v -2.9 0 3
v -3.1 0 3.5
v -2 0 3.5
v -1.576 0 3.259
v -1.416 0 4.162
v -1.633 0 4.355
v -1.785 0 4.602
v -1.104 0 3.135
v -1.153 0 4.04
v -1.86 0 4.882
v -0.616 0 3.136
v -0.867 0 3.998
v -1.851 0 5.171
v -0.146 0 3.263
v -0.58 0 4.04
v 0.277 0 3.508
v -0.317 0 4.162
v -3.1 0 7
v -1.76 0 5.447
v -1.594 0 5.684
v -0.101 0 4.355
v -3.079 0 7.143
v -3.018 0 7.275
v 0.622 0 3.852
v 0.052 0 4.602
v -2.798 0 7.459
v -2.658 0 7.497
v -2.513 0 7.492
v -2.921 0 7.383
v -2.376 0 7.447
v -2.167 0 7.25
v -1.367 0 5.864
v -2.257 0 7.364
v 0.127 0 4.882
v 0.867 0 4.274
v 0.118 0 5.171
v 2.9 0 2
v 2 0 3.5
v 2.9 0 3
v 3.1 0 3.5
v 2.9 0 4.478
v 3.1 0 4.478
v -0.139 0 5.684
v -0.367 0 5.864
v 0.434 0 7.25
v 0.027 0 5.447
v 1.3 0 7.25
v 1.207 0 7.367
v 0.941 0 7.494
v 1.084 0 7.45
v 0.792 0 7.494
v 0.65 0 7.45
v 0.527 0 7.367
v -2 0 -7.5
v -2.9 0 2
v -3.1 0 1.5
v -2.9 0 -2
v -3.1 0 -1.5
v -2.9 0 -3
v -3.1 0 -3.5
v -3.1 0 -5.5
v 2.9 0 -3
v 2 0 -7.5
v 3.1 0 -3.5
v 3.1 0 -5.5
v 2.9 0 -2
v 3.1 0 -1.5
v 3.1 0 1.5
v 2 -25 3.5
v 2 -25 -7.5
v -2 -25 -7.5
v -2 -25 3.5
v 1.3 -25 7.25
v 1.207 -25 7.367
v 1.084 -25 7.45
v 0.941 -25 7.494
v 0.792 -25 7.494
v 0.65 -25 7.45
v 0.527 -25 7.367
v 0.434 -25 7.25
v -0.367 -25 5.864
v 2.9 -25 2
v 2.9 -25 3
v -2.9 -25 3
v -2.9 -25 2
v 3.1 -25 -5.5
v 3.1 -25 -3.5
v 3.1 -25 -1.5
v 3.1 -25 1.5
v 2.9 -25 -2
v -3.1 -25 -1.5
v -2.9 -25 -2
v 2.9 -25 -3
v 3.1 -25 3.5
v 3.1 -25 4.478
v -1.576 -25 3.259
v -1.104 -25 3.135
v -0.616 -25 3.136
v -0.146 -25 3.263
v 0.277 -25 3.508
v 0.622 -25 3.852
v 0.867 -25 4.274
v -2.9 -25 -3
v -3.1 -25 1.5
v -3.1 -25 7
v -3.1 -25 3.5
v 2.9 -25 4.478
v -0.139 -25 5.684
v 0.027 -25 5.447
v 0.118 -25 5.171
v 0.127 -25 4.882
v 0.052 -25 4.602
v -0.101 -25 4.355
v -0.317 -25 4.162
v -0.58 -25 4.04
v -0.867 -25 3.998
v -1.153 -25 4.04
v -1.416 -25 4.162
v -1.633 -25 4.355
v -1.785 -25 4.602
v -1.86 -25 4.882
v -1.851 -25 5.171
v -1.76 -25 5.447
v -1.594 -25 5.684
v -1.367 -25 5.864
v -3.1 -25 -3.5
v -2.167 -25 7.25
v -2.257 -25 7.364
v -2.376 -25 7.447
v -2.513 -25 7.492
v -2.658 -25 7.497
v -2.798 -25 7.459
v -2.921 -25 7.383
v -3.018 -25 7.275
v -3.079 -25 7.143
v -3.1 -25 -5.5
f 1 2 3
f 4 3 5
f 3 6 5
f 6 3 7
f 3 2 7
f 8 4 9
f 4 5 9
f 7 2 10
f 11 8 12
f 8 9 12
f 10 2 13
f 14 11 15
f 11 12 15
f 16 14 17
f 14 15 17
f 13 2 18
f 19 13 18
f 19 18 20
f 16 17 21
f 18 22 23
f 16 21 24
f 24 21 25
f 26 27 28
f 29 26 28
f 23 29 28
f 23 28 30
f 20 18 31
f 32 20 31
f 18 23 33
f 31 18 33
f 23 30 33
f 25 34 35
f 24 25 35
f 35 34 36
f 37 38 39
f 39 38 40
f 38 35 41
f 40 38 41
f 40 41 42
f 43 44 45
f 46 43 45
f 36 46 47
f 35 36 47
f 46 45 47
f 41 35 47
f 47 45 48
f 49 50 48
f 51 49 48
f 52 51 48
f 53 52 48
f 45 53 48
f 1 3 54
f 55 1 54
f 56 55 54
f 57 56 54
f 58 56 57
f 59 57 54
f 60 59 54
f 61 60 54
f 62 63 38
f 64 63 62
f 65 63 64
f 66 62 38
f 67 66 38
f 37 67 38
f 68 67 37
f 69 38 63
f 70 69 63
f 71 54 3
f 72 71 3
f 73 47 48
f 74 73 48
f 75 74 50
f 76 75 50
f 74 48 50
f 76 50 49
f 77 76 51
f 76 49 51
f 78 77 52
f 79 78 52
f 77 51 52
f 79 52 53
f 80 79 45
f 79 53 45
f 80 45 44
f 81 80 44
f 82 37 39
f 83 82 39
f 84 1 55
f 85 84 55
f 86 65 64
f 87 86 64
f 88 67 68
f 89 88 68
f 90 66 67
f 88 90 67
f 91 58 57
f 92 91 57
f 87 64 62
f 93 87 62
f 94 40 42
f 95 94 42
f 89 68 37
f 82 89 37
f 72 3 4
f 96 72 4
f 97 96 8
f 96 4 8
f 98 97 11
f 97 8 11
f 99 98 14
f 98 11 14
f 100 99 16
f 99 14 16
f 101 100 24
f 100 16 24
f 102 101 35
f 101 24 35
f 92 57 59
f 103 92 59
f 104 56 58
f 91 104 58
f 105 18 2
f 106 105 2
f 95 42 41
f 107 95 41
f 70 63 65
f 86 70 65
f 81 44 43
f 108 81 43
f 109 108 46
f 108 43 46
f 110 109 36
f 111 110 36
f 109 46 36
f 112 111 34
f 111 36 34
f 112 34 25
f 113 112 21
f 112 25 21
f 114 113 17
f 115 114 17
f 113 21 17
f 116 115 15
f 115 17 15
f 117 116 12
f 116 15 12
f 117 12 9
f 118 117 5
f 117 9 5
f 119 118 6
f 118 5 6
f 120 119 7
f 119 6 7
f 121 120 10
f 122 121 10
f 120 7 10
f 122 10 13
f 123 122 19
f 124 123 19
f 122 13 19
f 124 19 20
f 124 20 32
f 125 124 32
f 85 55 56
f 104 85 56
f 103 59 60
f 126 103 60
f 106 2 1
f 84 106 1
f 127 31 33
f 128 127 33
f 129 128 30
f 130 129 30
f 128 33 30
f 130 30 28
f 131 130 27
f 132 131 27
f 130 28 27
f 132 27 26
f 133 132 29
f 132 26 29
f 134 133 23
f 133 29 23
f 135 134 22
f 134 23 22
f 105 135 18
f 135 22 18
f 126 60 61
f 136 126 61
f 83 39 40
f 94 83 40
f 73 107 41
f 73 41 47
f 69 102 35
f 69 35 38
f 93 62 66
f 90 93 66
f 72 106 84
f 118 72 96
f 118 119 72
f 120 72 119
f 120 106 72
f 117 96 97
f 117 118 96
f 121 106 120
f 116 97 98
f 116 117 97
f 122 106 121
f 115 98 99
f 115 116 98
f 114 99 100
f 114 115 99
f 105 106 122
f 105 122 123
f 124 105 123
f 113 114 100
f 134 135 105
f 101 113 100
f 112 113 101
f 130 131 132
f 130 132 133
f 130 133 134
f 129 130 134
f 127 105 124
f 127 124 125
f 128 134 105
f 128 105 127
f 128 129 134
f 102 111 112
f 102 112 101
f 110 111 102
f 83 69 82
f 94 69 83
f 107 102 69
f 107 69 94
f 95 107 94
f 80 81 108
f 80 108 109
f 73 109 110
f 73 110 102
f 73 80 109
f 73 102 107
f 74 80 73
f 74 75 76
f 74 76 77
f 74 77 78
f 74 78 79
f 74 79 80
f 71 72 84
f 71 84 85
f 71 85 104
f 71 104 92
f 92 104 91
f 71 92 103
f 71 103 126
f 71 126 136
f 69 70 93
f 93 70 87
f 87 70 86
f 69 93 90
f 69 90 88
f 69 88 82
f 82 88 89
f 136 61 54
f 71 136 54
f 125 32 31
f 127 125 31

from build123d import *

# Parameters (mm, degrees)
F1_DEPTH = 25


with BuildPart() as f1:
    # F0 (on Front) → F1 (new body)
    with BuildSketch(Plane.XZ):
        with BuildLine():
            Line((-2, -7.5), (-2, 3.5))
            ThreePointArc((-2, 3.5), (-0.376864, 3.184528), (0.866667, 4.274356))
            Line((0.866667, 4.274356), (2, 3.5))
            Line((2, 3.5), (2, -7.5))
            Line((2, -7.5), (3.1, -5.5))
            Line((3.1, -5.5), (3.1, -3.5))
            Line((3.1, -3.5), (2.9, -3))
            Line((2.9, -3), (2.9, -2))
            Line((2.9, -2), (3.1, -1.5))
            Line((3.1, -1.5), (3.1, 1.5))
            Line((3.1, 1.5), (2.9, 2))
            Line((2.9, 2), (2.9, 3))
            Line((2.9, 3), (3.1, 3.5))
            Line((3.1, 3.5), (3.1, 4.478163))
            Line((3.1, 4.478163), (2.9, 4.478163))
            Line((2.9, 4.478163), (1.299679, 7.25))
            ThreePointArc((1.299679, 7.25), (0.866667, 7.5), (0.433654, 7.25))
            Line((0.433654, 7.25), (-0.366667, 5.863804))
            ThreePointArc((-0.366667, 5.863804), (-0.866667, 3.997779), (-1.366667, 5.863804))
            Line((-1.366667, 5.863804), (-2.166987, 7.25))
            ThreePointArc((-2.166987, 7.25), (-2.72941, 7.482963), (-3.1, 7))
            Line((-3.1, 7), (-3.1, 3.5))
            Line((-3.1, 3.5), (-2.9, 3))
            Line((-2.9, 3), (-2.9, 2))
            Line((-2.9, 2), (-3.1, 1.5))
            Line((-3.1, 1.5), (-3.1, -1.5))
            Line((-3.1, -1.5), (-2.9, -2))
            Line((-2.9, -2), (-2.9, -3))
            Line((-2.9, -3), (-3.1, -3.5))
            Line((-3.1, -3.5), (-3.1, -5.5))
            Line((-3.1, -5.5), (-2, -7.5))
        make_face()
    extrude(amount=F1_DEPTH)


solid = f1.part
